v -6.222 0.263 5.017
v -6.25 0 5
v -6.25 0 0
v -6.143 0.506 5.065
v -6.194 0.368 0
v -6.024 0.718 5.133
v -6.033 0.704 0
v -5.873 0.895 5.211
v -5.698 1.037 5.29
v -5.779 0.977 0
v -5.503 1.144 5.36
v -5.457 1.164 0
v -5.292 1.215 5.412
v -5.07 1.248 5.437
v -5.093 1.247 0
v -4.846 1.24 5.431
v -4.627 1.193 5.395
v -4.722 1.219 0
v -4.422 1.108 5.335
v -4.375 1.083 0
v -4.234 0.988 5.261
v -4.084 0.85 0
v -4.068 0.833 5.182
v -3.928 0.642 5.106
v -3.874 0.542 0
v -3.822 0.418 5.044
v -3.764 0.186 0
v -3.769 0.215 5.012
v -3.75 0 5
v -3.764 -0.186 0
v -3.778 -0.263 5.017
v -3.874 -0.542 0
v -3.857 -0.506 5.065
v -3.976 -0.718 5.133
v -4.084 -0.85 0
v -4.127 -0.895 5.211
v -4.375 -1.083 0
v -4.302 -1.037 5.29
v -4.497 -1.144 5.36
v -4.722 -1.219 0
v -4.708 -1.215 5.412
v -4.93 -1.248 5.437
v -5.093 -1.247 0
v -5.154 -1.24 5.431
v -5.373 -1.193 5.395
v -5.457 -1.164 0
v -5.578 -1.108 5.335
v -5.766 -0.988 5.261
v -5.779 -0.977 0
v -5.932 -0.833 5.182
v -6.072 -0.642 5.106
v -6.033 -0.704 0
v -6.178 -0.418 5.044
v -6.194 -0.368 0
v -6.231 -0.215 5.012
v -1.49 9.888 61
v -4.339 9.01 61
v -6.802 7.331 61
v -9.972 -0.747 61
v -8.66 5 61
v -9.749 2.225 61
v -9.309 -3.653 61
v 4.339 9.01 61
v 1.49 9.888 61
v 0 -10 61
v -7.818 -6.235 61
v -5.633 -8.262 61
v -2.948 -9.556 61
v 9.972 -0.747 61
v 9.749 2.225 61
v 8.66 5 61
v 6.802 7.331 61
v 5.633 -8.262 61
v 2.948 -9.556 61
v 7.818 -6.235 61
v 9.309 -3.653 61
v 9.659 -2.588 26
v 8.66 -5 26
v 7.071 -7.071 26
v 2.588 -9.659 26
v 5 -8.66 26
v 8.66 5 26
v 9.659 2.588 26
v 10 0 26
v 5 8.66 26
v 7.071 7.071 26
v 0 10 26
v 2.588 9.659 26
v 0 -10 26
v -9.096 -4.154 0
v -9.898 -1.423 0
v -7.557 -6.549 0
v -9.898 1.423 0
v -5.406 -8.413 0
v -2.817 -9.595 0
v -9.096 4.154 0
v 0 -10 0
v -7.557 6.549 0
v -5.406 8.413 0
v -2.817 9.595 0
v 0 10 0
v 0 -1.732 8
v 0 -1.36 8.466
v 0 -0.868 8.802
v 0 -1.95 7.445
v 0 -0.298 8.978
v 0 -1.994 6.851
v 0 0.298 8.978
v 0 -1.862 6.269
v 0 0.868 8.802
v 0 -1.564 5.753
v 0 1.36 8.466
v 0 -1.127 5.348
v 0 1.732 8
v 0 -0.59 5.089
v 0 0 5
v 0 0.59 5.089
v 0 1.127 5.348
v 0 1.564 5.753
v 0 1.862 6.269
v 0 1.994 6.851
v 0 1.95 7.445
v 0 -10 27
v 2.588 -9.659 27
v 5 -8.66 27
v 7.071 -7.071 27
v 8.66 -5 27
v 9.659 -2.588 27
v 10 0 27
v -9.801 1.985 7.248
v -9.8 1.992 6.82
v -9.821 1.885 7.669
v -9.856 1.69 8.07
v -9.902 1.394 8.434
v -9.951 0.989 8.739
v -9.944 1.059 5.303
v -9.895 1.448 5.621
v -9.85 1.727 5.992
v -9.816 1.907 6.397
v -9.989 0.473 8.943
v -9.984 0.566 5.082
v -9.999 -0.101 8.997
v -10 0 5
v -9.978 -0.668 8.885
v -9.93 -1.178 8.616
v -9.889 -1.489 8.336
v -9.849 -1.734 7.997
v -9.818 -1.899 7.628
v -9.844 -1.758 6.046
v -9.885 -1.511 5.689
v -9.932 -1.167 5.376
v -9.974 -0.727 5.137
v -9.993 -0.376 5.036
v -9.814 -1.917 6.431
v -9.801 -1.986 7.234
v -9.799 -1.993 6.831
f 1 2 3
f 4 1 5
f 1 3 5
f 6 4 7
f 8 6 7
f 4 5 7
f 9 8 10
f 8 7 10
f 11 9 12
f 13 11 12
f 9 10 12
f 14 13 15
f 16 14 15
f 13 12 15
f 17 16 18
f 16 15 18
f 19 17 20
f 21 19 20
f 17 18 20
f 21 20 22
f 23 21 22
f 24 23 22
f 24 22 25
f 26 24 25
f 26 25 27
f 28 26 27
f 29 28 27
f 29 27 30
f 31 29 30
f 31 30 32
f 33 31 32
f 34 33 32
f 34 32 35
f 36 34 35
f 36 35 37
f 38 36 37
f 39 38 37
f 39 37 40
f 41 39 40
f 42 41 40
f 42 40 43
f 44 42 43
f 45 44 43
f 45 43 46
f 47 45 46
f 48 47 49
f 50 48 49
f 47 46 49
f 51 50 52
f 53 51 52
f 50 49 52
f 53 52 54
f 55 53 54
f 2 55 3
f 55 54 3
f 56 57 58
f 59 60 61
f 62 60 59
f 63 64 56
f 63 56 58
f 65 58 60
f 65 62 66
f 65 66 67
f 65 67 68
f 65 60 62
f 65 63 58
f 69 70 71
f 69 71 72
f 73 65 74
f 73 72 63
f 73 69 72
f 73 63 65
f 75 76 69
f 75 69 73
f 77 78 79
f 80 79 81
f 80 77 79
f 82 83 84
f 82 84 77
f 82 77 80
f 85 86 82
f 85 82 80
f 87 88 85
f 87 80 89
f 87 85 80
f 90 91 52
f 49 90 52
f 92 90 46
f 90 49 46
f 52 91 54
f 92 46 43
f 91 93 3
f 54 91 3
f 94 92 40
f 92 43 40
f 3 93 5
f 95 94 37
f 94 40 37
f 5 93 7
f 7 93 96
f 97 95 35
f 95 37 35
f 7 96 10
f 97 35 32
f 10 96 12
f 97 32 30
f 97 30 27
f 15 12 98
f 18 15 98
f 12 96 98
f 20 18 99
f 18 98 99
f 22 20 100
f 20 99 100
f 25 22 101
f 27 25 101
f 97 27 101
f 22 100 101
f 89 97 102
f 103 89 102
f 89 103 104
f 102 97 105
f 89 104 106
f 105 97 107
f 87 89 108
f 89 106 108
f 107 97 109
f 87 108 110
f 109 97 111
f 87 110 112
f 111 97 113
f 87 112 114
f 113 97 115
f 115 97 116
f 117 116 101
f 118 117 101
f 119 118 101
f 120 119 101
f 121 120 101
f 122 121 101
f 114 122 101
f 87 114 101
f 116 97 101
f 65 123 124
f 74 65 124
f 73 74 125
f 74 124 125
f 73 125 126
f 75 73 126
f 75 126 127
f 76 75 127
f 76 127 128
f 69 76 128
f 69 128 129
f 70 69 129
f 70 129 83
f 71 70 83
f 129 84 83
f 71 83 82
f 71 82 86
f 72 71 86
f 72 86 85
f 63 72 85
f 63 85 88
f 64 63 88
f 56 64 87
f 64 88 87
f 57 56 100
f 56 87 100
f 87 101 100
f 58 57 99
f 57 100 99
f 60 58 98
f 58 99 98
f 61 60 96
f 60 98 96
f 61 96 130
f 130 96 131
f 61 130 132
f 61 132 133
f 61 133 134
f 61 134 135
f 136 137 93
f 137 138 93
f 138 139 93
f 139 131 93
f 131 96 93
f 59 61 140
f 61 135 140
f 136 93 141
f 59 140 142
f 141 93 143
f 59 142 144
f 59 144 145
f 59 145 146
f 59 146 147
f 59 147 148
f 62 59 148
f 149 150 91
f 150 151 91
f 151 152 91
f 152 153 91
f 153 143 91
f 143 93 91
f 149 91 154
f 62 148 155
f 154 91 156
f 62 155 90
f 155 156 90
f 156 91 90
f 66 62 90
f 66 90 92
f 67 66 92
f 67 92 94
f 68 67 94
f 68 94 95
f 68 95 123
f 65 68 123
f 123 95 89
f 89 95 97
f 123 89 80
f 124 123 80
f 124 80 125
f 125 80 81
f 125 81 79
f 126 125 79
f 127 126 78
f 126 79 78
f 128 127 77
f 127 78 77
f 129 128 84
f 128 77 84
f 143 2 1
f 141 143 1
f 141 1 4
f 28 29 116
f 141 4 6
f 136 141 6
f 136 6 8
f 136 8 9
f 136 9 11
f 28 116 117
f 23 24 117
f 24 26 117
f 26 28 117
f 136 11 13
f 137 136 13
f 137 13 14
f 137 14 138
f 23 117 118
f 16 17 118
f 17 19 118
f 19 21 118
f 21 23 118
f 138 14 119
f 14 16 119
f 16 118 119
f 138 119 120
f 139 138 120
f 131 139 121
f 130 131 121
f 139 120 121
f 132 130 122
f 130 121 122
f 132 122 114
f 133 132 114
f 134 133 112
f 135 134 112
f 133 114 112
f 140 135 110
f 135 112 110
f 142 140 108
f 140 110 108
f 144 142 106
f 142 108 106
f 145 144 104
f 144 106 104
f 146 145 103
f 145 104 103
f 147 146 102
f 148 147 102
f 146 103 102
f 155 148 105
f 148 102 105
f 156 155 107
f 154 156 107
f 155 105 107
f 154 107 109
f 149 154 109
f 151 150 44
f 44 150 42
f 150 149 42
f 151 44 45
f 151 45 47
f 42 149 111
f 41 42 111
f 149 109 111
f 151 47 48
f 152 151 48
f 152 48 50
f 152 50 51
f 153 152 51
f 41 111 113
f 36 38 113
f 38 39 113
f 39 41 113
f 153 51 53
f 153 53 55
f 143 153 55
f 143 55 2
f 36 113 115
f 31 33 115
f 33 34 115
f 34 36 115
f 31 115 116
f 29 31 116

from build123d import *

# Parameters (mm, degrees)
SKETCH_1_R          = 10
EXTRUDE_1_DEPTH     = 27
SKETCH_3_W          = 10
SKETCH_3_H          = 20
CUT_EXTRUDE_2_DEPTH = 26
SKETCH_5_R          = 10
EXTRUDE_2_DEPTH     = 34
SKETCH_4_R          = 2
CUT_EXTRUDE_3_DEPTH = 63.617888818
M3X0_5_1_REACH      = 64.618
M3X0_5_1_BORE_R     = 1.25


with BuildPart() as part:
    # ｽｹｯﾁ1 → ﾎﾞｽ - 押し出し1 (new body)
    with BuildSketch(Plane.XY):
        Circle(SKETCH_1_R)
    extrude(amount=EXTRUDE_1_DEPTH)

    # ｽｹｯﾁ3 → ｶｯﾄ - 押し出し2 (cut)
    with BuildSketch(Plane(origin=(0, 0, 0), x_dir=(-1, 0, 0), z_dir=(0, 0, -1))):
        with Locations((-5, 0)):
            Rectangle(SKETCH_3_W, SKETCH_3_H)
    extrude(amount=-CUT_EXTRUDE_2_DEPTH, mode=Mode.SUBTRACT)

    # ｽｹｯﾁ5 → ﾎﾞｽ - 押し出し2 (add)
    with BuildSketch(Plane.XY.offset(27)):
        with Locations(Location((0, 0, 0), (0, 0, 270))):
            Circle(SKETCH_5_R)
    extrude(amount=EXTRUDE_2_DEPTH)

    # ｽｹｯﾁ4 → ｶｯﾄ - 押し出し3 (cut, through all)
    with BuildSketch(Plane(origin=(0, 0, 0), x_dir=(0, 0, -1), z_dir=(1, 0, 0))):
        with Locations((-7, 0)):
            Circle(SKETCH_4_R)
    extrude(amount=-CUT_EXTRUDE_3_DEPTH, mode=Mode.SUBTRACT)

    # M3x0.5 ねじ穴1 bore → M3x0.5 ねじ穴1 (cut, up to next)
    with BuildSketch(Plane(origin=(0, 0, 0), x_dir=(-1, 0, 0), z_dir=(0, 0, -1)), mode=Mode.PRIVATE) as m3x0_5_1_sk1:
        with Locations((5, 0)):
            Circle(M3X0_5_1_BORE_R)
    m3x0_5_1_tool1 = extrude(m3x0_5_1_sk1.sketch, amount=-M3X0_5_1_REACH, mode=Mode.PRIVATE) & part.part
    add(m3x0_5_1_tool1.solids().sort_by_distance((-5, 0, 0))[0], mode=Mode.SUBTRACT)


solid = part.part
